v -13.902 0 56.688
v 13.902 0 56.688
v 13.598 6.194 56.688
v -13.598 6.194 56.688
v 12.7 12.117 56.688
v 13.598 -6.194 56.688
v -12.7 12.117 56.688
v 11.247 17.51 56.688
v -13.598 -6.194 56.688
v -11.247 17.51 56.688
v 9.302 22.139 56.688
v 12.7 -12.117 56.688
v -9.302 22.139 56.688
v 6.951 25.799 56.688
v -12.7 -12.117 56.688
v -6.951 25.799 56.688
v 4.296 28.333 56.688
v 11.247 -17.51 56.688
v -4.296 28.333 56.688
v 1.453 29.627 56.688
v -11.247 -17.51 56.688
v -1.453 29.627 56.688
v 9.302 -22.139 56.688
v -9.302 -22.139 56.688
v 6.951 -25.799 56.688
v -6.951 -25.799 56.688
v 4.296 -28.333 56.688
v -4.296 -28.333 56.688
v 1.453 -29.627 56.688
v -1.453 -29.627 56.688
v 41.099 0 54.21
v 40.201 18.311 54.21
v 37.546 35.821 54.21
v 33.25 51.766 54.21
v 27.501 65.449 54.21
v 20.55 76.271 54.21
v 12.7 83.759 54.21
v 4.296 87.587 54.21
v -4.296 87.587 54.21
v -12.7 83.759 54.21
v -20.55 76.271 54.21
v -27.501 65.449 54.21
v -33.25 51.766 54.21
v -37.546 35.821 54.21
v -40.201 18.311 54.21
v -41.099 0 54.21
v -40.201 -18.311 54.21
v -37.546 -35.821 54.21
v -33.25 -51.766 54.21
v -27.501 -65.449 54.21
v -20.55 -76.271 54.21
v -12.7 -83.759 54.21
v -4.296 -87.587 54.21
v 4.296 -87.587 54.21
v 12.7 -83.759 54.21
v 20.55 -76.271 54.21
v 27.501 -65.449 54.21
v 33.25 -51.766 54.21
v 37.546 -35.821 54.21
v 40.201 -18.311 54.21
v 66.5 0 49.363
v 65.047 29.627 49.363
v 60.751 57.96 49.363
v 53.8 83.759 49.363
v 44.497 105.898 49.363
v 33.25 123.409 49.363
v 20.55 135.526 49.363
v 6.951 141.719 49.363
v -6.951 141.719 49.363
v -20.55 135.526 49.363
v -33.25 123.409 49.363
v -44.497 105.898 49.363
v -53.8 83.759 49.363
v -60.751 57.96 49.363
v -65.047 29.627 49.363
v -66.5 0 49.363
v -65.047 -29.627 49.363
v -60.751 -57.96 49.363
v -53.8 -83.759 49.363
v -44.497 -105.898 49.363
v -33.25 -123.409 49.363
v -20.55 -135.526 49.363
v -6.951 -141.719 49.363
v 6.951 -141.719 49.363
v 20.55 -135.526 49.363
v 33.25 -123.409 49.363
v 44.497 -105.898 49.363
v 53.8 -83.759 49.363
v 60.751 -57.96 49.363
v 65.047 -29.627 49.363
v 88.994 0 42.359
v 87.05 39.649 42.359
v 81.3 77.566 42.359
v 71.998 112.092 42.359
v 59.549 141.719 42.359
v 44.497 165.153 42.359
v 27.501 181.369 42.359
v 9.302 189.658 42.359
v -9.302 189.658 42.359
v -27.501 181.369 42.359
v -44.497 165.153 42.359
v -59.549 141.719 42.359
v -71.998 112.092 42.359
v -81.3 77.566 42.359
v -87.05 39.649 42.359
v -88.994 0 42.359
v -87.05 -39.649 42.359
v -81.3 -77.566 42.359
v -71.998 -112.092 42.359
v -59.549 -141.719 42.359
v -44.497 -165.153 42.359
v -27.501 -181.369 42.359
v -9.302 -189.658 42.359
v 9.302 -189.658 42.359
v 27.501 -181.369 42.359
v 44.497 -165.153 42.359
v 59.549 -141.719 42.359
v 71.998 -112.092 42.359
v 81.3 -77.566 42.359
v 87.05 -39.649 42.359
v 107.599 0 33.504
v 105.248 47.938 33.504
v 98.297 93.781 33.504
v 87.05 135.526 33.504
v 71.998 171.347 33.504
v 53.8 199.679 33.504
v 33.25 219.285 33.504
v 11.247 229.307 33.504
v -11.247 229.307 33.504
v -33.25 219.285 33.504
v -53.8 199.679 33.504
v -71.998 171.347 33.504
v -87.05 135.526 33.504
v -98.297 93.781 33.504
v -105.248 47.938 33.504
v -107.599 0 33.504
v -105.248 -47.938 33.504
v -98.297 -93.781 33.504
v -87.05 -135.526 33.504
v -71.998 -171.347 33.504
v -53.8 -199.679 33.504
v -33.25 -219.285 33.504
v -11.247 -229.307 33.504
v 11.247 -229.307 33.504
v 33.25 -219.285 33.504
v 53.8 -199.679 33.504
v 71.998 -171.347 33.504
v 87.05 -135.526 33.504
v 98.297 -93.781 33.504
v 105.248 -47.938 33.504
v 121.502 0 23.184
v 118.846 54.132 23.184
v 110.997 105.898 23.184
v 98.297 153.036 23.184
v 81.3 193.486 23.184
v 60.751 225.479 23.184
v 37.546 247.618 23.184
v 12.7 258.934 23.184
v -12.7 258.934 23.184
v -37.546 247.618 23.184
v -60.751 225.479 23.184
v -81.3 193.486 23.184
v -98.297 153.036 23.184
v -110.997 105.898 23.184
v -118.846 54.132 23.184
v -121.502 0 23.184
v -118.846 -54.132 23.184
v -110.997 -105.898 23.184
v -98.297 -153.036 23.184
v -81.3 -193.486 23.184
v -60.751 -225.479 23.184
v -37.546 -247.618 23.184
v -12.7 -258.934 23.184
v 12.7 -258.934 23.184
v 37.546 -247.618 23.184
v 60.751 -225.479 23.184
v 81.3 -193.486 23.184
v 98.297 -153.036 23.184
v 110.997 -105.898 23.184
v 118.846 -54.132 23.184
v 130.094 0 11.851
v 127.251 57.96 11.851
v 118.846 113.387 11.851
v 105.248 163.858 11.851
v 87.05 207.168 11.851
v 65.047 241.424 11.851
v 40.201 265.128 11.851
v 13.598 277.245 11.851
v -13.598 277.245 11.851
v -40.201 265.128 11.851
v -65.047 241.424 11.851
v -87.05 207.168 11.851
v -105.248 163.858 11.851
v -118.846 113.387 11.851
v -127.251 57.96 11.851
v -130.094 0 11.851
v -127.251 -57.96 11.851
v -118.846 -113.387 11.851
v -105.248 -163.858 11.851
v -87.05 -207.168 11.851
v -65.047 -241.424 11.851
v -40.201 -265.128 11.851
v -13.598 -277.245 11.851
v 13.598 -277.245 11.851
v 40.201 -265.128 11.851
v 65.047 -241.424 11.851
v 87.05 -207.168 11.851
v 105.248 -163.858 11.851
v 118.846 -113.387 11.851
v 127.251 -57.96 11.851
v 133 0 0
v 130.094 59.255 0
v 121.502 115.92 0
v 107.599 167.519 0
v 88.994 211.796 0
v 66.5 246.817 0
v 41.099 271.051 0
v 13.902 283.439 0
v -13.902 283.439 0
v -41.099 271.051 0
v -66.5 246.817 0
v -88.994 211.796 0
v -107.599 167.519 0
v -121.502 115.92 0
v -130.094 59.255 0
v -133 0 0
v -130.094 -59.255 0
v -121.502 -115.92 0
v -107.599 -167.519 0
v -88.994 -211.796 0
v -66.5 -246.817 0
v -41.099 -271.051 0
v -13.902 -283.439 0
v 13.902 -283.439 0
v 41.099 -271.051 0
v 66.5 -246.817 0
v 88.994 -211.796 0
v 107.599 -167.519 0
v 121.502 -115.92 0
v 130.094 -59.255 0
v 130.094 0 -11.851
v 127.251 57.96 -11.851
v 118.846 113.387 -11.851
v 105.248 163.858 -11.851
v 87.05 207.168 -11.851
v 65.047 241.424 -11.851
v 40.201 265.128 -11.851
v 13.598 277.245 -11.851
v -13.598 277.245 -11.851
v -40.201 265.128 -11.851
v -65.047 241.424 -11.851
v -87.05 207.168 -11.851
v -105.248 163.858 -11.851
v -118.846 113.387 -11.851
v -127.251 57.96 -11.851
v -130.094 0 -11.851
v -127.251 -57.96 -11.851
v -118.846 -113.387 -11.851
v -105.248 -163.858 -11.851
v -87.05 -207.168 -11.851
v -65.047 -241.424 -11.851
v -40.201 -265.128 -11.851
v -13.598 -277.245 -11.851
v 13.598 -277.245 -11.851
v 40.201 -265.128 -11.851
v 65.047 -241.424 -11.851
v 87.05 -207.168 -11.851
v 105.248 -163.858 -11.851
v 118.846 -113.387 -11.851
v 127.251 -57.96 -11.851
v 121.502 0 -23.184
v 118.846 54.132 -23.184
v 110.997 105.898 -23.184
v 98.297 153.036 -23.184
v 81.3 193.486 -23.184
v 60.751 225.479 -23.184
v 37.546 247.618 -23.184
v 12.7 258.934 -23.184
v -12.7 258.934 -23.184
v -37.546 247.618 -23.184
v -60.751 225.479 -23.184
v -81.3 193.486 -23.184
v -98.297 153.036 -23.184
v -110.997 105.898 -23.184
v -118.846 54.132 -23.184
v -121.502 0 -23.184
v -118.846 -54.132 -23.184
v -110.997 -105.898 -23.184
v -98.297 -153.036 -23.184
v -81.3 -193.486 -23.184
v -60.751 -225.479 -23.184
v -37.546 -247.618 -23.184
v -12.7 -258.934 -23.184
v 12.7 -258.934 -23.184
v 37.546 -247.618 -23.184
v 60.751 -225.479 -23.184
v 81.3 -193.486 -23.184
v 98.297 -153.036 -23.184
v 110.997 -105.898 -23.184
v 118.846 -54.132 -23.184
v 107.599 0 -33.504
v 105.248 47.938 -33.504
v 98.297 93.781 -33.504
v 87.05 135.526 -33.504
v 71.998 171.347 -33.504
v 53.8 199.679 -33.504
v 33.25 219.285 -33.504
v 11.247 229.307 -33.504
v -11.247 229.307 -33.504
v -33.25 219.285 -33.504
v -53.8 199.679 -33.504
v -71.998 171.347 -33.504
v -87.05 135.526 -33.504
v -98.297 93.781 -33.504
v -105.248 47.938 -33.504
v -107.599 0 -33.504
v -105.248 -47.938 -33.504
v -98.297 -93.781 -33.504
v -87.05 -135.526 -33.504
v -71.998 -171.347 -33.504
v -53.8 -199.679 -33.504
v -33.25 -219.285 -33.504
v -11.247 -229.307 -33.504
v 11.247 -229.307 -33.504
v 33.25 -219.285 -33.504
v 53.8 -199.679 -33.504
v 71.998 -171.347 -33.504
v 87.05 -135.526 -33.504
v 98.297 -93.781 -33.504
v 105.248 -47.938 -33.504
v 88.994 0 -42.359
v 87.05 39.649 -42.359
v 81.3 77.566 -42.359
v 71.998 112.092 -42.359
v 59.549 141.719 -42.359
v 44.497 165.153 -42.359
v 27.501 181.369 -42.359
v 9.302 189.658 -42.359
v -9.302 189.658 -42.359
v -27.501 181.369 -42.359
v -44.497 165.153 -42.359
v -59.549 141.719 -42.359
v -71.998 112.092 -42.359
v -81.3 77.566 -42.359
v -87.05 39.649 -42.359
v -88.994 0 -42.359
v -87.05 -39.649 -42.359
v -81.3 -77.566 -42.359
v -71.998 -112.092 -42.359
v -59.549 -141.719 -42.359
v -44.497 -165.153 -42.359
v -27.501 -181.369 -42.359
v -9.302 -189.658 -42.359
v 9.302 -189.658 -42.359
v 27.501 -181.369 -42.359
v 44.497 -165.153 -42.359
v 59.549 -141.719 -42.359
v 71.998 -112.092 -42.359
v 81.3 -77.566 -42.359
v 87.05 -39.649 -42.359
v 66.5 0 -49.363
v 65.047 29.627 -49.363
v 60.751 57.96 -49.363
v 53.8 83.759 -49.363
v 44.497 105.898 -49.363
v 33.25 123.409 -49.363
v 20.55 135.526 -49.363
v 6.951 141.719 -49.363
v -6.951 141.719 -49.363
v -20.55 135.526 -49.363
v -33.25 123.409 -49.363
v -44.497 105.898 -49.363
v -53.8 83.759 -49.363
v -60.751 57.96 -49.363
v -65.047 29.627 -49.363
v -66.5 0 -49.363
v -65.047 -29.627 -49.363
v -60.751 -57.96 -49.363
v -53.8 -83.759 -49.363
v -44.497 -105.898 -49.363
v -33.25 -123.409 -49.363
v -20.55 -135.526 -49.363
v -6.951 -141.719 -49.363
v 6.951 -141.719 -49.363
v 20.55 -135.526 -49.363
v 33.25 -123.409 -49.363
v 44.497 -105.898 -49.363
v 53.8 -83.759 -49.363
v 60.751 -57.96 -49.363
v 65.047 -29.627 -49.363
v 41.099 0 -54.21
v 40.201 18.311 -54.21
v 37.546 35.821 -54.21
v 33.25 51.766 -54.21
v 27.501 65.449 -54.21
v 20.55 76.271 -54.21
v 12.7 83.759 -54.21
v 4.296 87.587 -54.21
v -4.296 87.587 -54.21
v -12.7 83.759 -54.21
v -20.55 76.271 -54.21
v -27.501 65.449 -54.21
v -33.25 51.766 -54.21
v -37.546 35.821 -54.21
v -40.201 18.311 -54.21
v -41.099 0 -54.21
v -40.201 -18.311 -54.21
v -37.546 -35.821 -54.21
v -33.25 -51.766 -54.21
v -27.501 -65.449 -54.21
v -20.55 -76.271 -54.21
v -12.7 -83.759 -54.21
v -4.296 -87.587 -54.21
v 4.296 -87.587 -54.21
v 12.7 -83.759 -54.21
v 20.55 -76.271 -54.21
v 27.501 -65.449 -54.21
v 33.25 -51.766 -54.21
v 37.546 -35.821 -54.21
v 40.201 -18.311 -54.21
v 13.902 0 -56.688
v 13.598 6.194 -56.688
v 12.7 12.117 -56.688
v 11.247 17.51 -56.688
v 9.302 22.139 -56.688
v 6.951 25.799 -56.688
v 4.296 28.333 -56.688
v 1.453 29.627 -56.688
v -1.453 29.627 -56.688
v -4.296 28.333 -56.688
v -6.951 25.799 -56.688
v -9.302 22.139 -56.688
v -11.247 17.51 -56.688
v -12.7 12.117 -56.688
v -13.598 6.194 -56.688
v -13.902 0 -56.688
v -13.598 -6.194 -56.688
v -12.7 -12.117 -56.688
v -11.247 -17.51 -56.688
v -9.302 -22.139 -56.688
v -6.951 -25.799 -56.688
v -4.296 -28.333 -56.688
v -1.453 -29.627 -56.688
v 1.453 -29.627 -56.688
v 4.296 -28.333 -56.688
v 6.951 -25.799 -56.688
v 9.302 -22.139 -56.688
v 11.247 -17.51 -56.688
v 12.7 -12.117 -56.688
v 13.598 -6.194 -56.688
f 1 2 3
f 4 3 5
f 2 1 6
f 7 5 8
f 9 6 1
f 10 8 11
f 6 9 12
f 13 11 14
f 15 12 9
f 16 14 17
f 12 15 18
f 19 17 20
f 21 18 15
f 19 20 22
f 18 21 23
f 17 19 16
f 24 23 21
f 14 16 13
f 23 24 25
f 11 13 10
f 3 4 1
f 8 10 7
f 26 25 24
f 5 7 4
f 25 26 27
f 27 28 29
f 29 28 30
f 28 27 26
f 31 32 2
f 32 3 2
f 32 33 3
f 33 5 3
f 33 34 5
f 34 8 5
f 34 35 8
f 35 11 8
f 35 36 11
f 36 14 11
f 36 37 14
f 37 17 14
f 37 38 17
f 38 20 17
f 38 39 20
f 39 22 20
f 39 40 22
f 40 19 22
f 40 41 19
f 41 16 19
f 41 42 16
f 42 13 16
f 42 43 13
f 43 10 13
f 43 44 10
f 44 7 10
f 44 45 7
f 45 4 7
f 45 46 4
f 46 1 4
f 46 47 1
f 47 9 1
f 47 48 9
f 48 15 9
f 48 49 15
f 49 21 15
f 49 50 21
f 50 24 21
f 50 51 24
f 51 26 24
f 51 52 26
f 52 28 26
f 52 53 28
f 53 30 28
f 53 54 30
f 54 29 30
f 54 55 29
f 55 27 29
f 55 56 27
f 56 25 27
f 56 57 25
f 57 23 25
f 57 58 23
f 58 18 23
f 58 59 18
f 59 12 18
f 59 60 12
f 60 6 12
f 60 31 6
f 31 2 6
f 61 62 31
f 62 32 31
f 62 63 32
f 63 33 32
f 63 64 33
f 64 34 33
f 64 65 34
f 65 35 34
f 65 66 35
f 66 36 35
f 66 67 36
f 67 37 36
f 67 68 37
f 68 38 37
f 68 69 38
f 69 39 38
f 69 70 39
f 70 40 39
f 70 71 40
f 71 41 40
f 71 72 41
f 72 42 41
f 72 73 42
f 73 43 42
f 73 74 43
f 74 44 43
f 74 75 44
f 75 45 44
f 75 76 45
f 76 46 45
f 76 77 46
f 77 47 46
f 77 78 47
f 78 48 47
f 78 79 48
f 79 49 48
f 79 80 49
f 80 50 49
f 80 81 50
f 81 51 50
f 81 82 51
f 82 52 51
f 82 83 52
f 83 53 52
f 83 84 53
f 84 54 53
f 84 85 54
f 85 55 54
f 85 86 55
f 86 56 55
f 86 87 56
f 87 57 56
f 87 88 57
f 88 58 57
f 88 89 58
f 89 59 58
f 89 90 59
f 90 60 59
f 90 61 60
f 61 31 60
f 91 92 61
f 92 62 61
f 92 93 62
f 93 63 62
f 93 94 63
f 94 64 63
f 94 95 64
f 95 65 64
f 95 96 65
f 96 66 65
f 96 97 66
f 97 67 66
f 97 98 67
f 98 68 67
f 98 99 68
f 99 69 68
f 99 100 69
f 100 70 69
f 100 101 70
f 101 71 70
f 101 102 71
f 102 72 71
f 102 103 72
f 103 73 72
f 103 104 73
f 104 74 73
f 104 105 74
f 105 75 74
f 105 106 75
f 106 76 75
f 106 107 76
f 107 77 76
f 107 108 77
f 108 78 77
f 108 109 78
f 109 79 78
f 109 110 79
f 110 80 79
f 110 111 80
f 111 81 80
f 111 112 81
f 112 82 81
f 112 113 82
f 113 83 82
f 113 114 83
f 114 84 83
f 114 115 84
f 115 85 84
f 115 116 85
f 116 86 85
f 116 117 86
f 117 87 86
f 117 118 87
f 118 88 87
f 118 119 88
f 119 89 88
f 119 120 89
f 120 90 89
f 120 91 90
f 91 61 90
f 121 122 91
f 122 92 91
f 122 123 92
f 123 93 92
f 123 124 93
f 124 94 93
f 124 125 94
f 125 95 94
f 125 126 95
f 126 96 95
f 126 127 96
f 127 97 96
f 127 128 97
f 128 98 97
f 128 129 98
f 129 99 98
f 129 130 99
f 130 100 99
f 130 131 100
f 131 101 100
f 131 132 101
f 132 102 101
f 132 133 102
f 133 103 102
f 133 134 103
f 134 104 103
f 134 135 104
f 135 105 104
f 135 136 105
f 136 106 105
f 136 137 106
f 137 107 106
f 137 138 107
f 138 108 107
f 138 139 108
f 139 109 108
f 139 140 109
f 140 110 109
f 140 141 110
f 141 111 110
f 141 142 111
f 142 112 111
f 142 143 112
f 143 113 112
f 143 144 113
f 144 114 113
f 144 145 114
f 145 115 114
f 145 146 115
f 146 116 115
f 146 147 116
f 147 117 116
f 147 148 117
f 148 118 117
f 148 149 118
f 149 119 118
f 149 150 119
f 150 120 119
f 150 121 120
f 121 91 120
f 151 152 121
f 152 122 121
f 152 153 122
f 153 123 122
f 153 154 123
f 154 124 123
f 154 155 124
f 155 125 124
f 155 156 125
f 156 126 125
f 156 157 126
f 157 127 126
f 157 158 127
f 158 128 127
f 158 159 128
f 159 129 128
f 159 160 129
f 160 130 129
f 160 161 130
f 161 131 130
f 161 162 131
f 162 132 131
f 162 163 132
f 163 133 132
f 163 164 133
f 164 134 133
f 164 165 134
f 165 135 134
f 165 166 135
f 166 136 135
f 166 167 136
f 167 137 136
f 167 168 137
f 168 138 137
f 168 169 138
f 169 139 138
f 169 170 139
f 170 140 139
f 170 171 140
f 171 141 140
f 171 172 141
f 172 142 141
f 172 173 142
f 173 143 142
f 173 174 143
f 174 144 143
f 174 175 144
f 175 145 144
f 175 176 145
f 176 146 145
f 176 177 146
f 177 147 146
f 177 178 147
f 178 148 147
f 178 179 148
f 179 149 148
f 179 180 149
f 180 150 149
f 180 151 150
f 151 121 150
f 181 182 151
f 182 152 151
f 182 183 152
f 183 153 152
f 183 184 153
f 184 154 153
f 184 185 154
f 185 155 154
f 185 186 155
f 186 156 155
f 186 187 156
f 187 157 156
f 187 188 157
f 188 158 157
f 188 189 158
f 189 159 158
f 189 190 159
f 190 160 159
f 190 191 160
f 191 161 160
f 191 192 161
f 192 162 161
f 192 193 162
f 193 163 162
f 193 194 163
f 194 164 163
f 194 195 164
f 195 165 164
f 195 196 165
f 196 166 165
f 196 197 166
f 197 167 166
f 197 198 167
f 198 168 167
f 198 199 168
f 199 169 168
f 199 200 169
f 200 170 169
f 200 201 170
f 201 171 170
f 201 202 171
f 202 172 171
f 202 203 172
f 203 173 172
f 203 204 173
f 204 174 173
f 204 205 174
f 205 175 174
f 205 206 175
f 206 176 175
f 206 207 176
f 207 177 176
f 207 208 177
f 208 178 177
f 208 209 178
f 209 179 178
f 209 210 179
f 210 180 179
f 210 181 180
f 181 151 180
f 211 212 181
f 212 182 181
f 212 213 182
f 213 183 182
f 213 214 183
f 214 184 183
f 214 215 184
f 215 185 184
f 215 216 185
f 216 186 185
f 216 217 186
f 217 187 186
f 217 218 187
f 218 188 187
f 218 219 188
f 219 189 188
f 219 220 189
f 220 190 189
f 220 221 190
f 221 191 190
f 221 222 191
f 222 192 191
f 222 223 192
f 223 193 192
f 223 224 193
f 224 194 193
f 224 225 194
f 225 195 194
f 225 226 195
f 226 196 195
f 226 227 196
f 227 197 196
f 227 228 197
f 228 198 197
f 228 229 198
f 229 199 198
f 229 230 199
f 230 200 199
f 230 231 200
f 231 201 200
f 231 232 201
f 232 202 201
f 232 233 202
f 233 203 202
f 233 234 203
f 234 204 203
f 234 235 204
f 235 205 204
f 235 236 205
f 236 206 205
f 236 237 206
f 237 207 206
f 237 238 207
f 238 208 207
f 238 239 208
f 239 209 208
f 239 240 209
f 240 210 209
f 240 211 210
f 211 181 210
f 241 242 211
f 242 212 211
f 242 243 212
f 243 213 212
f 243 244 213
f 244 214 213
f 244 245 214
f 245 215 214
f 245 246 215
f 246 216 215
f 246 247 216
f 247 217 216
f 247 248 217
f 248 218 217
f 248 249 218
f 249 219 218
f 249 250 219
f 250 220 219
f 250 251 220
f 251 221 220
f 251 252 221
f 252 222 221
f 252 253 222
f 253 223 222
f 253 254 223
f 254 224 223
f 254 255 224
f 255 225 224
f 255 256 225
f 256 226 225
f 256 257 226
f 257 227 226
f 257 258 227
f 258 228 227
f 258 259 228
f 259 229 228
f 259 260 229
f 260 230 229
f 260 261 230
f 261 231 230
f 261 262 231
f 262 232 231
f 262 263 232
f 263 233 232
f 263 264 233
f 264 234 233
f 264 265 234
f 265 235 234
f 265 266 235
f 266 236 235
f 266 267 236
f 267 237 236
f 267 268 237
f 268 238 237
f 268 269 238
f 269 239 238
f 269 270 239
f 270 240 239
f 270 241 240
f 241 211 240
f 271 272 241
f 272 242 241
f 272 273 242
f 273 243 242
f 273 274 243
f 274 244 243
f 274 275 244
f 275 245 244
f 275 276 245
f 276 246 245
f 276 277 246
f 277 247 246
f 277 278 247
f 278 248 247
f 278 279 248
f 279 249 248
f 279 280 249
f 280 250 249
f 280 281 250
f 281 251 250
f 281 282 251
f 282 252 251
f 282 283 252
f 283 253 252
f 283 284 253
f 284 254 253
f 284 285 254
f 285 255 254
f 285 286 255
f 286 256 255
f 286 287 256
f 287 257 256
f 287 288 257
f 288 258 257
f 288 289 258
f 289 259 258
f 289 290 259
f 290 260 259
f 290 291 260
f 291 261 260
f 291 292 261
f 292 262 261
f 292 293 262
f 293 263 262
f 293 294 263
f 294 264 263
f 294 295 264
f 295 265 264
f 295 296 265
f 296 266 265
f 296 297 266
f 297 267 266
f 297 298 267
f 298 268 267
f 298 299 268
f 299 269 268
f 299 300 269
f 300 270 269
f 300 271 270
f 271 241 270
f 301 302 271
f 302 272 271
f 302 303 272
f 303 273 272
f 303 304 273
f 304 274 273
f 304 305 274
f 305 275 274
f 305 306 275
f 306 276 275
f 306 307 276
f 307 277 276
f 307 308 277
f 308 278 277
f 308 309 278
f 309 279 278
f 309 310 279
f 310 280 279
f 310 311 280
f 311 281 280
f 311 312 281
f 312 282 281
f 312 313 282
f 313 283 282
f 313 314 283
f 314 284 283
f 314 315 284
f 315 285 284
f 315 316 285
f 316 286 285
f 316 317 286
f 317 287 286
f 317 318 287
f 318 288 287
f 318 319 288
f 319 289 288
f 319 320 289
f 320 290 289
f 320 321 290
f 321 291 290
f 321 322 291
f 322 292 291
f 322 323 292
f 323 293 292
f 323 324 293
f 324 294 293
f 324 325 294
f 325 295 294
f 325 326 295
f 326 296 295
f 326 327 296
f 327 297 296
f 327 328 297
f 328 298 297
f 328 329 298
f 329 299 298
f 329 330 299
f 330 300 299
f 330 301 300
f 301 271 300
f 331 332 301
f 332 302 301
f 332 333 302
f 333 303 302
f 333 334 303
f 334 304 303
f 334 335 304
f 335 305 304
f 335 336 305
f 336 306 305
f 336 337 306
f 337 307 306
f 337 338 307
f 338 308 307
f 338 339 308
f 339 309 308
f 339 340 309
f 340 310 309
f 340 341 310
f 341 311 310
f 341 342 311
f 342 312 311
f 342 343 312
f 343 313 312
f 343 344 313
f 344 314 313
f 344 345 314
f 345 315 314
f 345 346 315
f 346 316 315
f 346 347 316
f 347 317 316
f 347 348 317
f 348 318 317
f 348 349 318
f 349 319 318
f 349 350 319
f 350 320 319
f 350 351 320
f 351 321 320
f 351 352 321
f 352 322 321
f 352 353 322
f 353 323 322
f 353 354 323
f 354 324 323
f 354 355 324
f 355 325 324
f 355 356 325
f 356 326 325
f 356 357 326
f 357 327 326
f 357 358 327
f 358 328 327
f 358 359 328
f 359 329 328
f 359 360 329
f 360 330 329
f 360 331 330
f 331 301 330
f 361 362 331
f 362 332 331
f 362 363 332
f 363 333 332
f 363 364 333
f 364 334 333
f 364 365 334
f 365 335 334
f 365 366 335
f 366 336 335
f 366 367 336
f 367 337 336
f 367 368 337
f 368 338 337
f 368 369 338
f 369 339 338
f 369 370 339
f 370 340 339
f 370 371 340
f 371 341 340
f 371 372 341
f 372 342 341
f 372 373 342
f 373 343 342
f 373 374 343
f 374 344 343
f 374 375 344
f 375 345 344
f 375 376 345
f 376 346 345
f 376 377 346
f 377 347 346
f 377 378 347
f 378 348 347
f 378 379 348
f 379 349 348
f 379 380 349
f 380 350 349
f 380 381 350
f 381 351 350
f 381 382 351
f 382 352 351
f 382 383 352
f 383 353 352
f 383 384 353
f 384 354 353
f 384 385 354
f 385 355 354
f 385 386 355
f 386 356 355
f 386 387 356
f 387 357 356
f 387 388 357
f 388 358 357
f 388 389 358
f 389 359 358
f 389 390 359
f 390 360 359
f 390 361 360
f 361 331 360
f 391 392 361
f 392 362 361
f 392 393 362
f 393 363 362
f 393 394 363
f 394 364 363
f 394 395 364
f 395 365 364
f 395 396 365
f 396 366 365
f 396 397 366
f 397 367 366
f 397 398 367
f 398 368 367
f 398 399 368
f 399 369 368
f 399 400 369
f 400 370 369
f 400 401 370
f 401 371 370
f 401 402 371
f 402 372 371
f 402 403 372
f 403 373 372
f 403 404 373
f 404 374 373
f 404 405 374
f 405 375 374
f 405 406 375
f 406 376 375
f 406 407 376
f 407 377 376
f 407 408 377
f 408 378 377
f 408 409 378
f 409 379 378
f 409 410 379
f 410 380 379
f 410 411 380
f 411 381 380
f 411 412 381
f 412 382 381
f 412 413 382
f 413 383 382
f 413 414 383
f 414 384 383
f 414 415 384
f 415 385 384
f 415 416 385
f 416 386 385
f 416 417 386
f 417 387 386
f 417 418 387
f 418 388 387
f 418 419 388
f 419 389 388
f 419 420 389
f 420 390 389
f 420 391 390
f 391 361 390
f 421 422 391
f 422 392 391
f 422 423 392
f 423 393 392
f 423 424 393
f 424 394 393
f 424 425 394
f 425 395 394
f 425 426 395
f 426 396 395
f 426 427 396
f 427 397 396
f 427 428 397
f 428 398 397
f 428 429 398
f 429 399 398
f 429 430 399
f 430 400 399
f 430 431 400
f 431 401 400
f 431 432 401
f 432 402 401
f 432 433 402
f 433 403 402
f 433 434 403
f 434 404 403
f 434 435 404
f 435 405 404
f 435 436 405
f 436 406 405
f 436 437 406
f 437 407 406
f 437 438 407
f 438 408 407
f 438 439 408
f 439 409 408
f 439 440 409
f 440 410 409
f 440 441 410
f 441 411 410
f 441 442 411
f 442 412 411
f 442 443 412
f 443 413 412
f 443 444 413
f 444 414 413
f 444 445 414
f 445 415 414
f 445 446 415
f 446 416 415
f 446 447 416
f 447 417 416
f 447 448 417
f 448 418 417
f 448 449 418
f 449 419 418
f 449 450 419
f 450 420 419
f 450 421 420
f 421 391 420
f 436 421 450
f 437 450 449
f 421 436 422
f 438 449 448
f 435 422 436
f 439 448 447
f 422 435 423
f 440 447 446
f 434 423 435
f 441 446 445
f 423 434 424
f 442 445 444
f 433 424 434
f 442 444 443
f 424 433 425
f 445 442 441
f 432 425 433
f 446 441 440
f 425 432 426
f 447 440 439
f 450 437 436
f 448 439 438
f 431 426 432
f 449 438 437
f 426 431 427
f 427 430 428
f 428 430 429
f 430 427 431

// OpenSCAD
// Generated by SolidPython 1.0.1 on 2020-07-29 00:46:48


scale(v = [7, 15, 3]) {
	sphere(r = 19);
}
/***********************************************
*********      SolidPython code:      **********
************************************************
 
# import packages: SolidPython
from solid import *
from solid.utils import *
from itertools import chain, combinations, permutations


class Resize:

    def __init__(self, scad_file):
        self.scad_file = scad_file
        #self.scad_file = import_scad(scad_file)
        # cone/cylinder param:
        self.r1 = 0
        self.r2 = 0
        self.h = 0
        # rectangular prism param:
        self.w = 0
        self.l = 0
        # ellipse param:
        self.r = 0

    # import OpenScad code (file name corresponds to shape)


    # classify shape + parameters
    def assign(self, param1, param2, param3):
        if self.scad_file == 'cone.scad':
            self.r1 = param1
            self.r2 = param2
            self.h = param3
        elif self.scad_file == 'cylinder.scad':
            self.r1 = param1
            self.r2 = param2
            self.h = param3
        elif self.scad_file == 'rectangularPrism.scad':
            self.h = param1
            self.l = param2
            self.w = param3
        else:
            self.r = param1
            self.h = param2

    # resize parameters
    def iterate(self):
        x = range(3, 20, 2)
        i = 1
        if self.scad_file == 'cone.scad':
            tempList = list(permutations(x, 2))
            for temp in tempList:
                param1 = temp[0]
                param2 = temp[1]
                filepath = 'produced_scad_files/' + 'cone' + str(param1) + '_' + str(param2) + '_' + '.scad'
                scad_render_to_file(cylinder(h=param1, r1=param2, r2=0), filepath)

        elif self.scad_file == 'cylinder.scad':
            tempList = list(permutations(x, 3))
            for temp in tempList:
                param1 = temp[0]
                param2 = temp[1]
                filepath = 'produced_scad_files/' + 'cylinder' + str(param1) + '_' + str(param2) + '_' + '.scad'
                scad_render_to_file(cylinder(h=param1, r1=param2, r2=param2), filepath)

        elif self.scad_file == 'rectangularPrism.scad':
            tempList = list(permutations(x, 3))
            for temp in tempList:
                param1 = temp[0]
                param2 = temp[1]
                param3 = temp[2]
                filepath = 'produced_scad_files/' + 'rectangularPrism' + str(param1) + '_' + str(param2) + '_' + str(
                    param3) + '.scad'
                scad_render_to_file(cube(size=(param1, param2, param3)), filepath)

        elif self.scad_file == 'ellipse.scad':
            tempList = list(permutations(x, 4))
            for temp in tempList:
                param1 = temp[0]
                param2 = temp[1]
                param3 = temp[2]
                param4 = temp[3]
                filepath = 'produced_scad_files/' + 'ellipse' + str(param1) + '_' + str(param2) + '_' + str(param3) + '_' + str(param4) + '.scad'
                scad_render_to_file(scale([param1, param2, param3])(sphere(r=param4)), filepath)

    def render_to_scadfile(self):
        scad_render_to_file(scad, 'example.scad') 
 
************************************************/
